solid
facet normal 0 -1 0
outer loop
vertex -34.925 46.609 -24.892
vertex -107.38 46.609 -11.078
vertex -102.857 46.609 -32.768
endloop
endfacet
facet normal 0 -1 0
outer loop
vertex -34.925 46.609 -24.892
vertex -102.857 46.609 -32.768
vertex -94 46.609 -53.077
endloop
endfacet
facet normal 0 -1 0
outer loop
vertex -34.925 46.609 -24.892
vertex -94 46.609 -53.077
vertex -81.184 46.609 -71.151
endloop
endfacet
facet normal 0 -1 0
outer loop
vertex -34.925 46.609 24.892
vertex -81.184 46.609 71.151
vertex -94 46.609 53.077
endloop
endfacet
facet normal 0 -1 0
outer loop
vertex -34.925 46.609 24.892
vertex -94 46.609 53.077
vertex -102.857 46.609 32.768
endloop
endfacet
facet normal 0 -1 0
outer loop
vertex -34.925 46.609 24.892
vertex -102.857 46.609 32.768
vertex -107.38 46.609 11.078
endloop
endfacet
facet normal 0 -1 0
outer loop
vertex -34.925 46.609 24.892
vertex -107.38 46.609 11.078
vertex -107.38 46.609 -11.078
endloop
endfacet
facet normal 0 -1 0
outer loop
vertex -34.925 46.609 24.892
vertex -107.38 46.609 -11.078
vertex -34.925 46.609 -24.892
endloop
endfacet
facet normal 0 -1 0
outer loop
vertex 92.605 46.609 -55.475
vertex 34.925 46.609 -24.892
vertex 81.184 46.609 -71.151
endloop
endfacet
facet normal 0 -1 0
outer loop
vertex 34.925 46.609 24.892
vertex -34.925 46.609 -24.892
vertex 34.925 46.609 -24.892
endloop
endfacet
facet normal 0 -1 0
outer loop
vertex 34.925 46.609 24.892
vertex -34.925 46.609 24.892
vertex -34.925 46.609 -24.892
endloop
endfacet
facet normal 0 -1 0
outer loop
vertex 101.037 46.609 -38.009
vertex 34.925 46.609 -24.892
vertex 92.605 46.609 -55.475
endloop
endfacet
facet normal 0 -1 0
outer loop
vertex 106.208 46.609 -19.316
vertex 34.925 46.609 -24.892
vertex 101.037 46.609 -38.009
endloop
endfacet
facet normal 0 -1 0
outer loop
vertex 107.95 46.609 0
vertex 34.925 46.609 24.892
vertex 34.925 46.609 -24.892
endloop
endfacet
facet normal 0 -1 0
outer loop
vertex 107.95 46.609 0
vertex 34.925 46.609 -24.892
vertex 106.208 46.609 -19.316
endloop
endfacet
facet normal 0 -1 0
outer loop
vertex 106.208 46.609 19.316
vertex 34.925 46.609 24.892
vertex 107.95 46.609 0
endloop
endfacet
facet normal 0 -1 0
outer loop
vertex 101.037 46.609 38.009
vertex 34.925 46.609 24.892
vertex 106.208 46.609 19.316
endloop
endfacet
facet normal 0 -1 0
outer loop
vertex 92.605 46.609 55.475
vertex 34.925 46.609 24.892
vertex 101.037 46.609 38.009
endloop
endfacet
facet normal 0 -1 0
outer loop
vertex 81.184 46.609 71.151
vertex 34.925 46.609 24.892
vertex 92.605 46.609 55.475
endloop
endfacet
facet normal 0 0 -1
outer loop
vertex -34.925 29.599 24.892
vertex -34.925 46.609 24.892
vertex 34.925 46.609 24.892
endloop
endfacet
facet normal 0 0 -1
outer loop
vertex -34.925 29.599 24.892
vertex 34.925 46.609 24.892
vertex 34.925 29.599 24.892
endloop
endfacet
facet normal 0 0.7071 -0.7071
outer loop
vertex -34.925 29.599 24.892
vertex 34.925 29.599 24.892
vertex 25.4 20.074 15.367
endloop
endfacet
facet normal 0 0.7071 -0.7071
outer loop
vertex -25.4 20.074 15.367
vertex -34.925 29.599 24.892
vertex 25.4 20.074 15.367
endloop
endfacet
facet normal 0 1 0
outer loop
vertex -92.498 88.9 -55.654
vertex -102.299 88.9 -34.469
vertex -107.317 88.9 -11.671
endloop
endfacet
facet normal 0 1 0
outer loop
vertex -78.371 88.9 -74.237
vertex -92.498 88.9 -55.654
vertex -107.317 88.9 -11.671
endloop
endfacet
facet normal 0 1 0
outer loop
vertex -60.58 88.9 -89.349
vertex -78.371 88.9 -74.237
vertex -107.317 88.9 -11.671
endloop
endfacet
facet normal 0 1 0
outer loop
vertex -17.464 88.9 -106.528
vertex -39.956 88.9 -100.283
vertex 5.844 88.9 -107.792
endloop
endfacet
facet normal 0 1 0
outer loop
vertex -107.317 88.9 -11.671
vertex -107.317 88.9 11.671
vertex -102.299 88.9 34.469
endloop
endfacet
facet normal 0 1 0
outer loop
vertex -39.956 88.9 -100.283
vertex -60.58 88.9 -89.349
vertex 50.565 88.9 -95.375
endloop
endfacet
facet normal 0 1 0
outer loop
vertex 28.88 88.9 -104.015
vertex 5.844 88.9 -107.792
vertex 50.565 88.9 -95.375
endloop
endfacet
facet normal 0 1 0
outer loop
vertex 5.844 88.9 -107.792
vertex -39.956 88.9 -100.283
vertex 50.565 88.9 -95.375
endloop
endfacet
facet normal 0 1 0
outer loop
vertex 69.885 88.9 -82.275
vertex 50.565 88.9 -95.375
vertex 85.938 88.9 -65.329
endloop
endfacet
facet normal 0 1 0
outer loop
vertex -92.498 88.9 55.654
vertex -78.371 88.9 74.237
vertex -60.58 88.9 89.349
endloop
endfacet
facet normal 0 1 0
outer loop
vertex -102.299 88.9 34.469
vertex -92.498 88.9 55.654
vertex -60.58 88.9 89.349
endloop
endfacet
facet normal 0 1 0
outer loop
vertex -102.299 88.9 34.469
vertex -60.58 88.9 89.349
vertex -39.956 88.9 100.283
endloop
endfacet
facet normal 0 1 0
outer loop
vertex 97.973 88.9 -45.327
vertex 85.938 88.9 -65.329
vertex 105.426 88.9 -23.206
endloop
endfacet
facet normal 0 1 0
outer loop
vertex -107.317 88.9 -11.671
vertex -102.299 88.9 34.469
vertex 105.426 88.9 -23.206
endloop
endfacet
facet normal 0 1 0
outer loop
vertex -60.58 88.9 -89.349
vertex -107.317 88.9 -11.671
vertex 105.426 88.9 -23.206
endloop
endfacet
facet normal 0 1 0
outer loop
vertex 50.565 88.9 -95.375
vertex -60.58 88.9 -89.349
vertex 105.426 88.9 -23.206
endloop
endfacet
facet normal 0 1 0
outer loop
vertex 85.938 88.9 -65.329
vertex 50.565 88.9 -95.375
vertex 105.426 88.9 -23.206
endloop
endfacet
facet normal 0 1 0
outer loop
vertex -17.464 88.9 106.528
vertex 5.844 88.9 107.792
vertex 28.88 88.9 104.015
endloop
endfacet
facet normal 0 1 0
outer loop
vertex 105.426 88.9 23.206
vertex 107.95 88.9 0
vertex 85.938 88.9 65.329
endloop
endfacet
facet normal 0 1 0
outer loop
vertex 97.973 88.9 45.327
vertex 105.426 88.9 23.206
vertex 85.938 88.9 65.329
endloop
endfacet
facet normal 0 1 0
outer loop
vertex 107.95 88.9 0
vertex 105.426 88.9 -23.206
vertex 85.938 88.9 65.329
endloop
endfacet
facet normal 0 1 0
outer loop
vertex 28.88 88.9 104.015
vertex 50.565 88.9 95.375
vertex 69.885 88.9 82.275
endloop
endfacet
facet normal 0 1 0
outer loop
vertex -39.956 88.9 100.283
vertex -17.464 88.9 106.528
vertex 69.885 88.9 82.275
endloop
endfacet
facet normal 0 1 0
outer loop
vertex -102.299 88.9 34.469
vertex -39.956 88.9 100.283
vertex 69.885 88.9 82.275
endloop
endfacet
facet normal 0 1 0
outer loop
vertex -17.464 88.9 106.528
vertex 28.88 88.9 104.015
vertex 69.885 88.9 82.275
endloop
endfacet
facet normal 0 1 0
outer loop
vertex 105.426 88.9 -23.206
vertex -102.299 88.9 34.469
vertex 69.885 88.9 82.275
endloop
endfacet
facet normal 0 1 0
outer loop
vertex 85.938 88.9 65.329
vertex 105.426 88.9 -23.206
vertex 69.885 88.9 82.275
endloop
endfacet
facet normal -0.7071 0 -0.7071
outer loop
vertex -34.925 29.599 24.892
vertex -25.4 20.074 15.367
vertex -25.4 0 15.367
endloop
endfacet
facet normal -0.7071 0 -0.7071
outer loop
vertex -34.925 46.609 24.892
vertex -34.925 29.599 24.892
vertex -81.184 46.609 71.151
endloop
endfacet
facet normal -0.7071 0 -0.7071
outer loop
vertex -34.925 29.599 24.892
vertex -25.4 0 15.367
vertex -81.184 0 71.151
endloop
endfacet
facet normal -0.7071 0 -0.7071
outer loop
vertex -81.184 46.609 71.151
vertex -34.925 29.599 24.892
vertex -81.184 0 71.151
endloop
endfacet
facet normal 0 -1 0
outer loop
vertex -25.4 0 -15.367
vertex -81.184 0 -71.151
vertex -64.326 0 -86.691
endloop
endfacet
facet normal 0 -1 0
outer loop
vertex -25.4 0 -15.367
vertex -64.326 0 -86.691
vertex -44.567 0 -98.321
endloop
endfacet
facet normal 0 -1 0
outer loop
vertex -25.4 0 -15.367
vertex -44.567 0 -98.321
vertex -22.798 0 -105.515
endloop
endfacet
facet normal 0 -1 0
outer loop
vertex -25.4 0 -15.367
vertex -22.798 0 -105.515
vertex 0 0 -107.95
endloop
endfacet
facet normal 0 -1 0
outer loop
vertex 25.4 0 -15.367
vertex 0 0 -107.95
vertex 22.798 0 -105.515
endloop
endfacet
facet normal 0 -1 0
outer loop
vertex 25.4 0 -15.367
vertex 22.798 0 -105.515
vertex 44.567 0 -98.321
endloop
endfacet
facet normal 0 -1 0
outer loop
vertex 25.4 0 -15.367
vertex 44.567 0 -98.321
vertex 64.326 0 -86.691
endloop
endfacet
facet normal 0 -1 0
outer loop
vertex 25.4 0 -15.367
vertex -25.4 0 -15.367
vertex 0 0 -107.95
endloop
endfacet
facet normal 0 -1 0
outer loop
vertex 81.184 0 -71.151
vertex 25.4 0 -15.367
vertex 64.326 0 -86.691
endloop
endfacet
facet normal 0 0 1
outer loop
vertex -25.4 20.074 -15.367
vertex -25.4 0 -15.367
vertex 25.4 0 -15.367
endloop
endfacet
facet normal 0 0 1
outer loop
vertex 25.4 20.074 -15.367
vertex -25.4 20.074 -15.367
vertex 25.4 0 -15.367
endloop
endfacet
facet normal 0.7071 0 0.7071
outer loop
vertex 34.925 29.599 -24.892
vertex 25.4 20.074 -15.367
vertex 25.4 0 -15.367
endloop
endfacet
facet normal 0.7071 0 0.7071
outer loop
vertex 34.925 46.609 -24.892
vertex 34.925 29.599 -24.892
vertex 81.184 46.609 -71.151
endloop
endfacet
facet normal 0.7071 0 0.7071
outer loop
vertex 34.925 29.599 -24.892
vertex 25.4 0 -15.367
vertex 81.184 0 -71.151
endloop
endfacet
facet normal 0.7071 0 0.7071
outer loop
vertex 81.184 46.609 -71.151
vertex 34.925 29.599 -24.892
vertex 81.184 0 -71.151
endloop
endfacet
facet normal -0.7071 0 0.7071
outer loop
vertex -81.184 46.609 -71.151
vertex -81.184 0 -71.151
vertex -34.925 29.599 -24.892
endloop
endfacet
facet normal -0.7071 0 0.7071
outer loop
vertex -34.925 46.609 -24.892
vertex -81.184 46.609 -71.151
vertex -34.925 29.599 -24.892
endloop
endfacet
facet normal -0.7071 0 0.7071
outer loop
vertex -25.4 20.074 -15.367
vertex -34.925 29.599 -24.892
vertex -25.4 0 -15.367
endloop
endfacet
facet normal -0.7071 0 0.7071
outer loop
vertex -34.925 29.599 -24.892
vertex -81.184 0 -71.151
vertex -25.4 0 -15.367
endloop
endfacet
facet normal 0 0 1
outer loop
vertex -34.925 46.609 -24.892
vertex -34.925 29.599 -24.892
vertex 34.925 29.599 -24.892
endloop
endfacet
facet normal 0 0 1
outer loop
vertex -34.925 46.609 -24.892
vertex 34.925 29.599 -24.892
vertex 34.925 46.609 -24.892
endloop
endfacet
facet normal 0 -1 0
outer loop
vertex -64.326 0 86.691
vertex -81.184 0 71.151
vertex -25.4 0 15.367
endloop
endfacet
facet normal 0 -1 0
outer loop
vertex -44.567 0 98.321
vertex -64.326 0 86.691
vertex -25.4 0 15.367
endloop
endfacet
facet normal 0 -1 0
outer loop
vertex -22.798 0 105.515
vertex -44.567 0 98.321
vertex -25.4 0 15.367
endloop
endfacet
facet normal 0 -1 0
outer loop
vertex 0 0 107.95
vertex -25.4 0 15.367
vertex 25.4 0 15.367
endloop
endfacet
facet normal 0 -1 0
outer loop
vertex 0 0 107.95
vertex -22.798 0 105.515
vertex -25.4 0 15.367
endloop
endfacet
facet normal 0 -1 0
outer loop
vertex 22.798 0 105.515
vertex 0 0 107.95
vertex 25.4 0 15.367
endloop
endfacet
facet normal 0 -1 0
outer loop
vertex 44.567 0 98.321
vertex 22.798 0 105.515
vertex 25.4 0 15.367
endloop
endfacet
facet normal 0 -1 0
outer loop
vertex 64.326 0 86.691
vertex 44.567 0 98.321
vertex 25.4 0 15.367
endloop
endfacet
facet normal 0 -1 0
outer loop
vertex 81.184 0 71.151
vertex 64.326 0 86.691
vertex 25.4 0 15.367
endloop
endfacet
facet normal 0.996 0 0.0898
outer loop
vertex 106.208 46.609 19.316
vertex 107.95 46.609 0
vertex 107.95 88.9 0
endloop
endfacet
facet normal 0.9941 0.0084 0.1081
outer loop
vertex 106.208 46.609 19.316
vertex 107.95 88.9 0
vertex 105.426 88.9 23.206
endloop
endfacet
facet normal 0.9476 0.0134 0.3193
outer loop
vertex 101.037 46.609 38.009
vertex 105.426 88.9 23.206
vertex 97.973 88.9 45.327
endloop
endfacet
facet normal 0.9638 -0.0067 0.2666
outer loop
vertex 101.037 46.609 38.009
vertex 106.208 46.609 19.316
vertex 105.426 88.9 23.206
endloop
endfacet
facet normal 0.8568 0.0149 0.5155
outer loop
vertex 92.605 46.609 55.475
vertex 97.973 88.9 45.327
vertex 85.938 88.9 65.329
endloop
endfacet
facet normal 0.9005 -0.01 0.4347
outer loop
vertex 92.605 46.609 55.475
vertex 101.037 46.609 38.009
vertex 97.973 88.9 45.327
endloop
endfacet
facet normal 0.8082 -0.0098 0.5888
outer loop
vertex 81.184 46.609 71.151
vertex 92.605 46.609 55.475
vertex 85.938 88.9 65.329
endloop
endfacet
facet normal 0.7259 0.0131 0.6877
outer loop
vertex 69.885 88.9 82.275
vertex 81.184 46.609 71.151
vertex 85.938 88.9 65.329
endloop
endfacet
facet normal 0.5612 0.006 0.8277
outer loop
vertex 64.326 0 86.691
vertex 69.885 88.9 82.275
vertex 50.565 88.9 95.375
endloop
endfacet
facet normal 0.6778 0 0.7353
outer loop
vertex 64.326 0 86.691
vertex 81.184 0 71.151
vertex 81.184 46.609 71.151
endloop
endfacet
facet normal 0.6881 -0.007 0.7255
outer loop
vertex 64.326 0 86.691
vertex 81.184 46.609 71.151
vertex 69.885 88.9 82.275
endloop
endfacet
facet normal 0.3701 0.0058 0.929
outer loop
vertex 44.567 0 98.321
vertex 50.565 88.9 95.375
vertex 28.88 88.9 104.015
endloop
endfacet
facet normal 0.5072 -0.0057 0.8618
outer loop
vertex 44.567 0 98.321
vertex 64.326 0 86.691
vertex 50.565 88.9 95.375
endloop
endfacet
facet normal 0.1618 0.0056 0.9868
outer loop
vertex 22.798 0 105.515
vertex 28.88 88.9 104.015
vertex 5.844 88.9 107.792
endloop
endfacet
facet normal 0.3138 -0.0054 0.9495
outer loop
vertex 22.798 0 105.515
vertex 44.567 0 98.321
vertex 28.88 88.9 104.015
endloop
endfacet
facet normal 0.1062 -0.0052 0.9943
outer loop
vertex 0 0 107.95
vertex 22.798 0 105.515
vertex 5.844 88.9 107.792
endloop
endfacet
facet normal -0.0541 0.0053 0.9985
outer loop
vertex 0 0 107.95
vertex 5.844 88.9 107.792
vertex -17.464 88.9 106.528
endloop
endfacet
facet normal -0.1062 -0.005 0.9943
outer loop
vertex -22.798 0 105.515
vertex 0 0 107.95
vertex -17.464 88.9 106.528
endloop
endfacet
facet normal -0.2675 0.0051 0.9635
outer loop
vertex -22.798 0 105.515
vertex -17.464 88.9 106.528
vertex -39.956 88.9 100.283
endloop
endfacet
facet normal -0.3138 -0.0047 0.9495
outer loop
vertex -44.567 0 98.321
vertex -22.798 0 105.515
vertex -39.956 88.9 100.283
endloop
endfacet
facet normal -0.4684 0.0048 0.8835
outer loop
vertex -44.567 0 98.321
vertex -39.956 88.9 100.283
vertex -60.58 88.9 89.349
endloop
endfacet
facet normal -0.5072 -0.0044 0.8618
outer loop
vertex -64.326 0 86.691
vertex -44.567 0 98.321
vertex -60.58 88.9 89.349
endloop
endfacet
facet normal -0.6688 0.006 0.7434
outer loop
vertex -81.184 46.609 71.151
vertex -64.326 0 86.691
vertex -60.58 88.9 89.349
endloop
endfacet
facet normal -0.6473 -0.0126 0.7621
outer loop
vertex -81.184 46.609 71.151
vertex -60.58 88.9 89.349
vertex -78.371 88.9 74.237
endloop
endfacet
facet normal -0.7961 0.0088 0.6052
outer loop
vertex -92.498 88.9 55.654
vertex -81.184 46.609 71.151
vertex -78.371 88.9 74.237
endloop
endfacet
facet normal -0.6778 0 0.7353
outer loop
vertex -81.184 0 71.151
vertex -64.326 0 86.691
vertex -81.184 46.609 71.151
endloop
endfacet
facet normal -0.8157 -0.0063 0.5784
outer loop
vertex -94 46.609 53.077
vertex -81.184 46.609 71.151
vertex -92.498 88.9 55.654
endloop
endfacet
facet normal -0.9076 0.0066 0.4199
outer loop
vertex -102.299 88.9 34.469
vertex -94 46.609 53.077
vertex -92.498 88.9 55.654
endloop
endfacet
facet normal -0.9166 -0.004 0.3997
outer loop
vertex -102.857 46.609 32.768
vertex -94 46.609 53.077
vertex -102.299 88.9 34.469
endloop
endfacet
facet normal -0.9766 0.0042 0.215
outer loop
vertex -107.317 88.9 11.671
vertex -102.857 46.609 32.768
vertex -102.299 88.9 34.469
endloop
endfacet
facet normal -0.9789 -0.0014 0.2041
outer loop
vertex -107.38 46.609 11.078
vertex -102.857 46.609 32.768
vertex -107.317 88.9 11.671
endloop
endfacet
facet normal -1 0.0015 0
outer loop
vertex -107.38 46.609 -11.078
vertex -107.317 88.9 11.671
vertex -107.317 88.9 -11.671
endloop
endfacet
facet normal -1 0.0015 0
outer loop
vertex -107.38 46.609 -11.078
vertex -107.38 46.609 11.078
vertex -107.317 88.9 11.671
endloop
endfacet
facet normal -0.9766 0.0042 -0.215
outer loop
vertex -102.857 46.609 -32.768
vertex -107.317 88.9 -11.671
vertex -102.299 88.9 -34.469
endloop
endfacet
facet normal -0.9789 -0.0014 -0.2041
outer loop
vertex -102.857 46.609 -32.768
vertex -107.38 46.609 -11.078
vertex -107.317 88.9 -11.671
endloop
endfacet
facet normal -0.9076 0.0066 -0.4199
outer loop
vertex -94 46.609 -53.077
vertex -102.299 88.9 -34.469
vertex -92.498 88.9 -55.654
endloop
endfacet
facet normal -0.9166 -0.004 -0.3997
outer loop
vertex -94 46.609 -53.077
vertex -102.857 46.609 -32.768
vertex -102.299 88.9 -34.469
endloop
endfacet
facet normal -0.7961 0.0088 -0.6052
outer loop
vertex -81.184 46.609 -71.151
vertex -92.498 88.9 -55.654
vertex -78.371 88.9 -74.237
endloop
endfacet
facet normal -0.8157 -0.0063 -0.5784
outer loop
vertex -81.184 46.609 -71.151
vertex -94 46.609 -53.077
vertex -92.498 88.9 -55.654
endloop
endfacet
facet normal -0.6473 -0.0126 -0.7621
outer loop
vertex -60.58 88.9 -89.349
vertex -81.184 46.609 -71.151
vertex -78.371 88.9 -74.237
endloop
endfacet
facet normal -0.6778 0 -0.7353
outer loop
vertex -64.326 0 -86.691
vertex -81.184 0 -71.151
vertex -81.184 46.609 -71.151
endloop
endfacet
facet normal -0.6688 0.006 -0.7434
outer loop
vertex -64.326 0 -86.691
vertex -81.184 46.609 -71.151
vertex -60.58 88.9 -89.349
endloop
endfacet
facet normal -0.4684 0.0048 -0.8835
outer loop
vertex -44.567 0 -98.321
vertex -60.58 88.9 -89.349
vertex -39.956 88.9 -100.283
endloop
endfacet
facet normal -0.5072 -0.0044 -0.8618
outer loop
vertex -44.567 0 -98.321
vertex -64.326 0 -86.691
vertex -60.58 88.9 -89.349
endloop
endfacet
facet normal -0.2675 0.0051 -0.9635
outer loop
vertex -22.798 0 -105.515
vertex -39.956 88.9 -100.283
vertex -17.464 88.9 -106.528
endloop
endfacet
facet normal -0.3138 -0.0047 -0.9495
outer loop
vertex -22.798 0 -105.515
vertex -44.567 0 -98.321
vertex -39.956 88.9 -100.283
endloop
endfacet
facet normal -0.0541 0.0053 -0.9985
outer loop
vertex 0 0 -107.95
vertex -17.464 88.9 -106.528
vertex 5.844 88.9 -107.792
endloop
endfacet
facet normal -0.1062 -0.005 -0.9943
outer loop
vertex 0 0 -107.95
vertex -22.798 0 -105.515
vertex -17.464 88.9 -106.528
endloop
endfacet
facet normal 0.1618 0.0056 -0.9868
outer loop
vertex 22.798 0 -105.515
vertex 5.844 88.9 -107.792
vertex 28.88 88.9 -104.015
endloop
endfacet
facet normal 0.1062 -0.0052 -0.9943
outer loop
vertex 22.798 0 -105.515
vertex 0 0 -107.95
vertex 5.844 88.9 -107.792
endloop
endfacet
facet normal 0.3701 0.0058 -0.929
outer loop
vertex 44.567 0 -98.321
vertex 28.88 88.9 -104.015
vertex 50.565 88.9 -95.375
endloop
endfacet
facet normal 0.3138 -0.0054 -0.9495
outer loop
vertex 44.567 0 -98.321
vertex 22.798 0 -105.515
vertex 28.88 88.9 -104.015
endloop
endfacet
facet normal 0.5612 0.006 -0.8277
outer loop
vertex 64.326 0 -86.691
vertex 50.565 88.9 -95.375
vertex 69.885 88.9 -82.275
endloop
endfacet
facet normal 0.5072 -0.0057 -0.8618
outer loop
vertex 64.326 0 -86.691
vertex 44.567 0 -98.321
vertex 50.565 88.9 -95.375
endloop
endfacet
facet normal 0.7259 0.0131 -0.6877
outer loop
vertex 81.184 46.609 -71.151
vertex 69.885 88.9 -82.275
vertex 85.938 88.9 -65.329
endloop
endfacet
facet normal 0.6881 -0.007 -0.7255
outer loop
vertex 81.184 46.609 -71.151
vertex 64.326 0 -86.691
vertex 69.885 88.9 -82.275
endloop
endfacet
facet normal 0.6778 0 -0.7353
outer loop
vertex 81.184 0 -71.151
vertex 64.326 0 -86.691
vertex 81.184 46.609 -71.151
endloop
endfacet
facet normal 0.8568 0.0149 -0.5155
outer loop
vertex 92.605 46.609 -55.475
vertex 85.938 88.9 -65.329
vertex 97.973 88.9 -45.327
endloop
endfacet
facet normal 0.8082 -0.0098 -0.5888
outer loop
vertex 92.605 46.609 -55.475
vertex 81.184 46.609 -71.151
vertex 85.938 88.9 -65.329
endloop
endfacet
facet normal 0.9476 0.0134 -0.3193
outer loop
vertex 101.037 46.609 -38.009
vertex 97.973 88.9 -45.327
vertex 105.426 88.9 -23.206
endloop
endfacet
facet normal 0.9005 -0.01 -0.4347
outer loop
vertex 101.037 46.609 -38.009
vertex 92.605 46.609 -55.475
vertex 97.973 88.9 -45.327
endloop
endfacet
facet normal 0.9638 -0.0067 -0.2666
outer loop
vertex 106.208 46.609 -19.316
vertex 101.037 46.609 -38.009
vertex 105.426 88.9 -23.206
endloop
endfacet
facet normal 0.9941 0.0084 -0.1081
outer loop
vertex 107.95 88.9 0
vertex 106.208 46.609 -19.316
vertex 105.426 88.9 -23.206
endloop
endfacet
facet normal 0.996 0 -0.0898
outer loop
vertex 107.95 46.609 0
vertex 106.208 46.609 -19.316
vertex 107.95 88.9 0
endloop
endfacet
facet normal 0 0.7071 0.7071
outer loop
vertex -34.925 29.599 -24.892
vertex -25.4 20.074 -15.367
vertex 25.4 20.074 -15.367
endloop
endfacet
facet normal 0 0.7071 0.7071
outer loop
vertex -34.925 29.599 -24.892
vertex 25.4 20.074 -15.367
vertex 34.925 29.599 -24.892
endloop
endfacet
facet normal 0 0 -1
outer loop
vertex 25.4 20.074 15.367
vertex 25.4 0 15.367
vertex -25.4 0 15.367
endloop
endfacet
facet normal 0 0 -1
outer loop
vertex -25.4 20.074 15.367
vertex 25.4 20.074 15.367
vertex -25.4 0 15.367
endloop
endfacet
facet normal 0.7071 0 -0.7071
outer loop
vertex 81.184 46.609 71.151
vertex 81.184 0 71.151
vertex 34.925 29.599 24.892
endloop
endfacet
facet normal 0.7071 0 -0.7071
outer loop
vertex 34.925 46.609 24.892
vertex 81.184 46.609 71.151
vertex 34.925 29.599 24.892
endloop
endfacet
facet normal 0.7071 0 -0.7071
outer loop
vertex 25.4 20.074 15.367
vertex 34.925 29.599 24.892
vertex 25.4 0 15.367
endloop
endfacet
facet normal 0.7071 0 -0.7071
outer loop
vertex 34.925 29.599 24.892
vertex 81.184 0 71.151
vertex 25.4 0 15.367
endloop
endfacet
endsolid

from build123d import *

# Parameters (mm, degrees)
F0_R     = 107.95
F1_DEPTH = 88.9
F3_DEPTH = 46.609
F5_DEPTH = 100


with BuildPart() as f1:
    # F0 (on Front) → F1 (new body)
    with BuildSketch(Plane.XZ):
        Circle(F0_R)
    extrude(amount=-F1_DEPTH)

    # F2 (on Front) → F3 (cut)
    with BuildSketch(Plane.XZ):
        Polygon((25.4, 15.367), (-25.4, 15.367), (-112.20568, 102.17268), (-112.20568, -81.354253), (-99.756101, -89.723101), (-25.4, -15.367), (25.4, -15.367), (112.291815, -102.258815), (115.95138, 105.91838), align=None)
    extrude(amount=-F3_DEPTH, mode=Mode.SUBTRACT)

    # F4 (on Right) → F5 (cut, symmetric)
    with BuildSketch(Plane.YZ):
        Polygon((46.609, 24.892), (29.599, 24.892), (20.074, 15.367), (-10.548349, 15.367), (-10.548349, -15.017238), (20.074, -15.367), (29.599, -24.892), (46.609, -24.892), align=None)
    extrude(amount=F5_DEPTH, both=True, mode=Mode.SUBTRACT)


solid = f1.part
